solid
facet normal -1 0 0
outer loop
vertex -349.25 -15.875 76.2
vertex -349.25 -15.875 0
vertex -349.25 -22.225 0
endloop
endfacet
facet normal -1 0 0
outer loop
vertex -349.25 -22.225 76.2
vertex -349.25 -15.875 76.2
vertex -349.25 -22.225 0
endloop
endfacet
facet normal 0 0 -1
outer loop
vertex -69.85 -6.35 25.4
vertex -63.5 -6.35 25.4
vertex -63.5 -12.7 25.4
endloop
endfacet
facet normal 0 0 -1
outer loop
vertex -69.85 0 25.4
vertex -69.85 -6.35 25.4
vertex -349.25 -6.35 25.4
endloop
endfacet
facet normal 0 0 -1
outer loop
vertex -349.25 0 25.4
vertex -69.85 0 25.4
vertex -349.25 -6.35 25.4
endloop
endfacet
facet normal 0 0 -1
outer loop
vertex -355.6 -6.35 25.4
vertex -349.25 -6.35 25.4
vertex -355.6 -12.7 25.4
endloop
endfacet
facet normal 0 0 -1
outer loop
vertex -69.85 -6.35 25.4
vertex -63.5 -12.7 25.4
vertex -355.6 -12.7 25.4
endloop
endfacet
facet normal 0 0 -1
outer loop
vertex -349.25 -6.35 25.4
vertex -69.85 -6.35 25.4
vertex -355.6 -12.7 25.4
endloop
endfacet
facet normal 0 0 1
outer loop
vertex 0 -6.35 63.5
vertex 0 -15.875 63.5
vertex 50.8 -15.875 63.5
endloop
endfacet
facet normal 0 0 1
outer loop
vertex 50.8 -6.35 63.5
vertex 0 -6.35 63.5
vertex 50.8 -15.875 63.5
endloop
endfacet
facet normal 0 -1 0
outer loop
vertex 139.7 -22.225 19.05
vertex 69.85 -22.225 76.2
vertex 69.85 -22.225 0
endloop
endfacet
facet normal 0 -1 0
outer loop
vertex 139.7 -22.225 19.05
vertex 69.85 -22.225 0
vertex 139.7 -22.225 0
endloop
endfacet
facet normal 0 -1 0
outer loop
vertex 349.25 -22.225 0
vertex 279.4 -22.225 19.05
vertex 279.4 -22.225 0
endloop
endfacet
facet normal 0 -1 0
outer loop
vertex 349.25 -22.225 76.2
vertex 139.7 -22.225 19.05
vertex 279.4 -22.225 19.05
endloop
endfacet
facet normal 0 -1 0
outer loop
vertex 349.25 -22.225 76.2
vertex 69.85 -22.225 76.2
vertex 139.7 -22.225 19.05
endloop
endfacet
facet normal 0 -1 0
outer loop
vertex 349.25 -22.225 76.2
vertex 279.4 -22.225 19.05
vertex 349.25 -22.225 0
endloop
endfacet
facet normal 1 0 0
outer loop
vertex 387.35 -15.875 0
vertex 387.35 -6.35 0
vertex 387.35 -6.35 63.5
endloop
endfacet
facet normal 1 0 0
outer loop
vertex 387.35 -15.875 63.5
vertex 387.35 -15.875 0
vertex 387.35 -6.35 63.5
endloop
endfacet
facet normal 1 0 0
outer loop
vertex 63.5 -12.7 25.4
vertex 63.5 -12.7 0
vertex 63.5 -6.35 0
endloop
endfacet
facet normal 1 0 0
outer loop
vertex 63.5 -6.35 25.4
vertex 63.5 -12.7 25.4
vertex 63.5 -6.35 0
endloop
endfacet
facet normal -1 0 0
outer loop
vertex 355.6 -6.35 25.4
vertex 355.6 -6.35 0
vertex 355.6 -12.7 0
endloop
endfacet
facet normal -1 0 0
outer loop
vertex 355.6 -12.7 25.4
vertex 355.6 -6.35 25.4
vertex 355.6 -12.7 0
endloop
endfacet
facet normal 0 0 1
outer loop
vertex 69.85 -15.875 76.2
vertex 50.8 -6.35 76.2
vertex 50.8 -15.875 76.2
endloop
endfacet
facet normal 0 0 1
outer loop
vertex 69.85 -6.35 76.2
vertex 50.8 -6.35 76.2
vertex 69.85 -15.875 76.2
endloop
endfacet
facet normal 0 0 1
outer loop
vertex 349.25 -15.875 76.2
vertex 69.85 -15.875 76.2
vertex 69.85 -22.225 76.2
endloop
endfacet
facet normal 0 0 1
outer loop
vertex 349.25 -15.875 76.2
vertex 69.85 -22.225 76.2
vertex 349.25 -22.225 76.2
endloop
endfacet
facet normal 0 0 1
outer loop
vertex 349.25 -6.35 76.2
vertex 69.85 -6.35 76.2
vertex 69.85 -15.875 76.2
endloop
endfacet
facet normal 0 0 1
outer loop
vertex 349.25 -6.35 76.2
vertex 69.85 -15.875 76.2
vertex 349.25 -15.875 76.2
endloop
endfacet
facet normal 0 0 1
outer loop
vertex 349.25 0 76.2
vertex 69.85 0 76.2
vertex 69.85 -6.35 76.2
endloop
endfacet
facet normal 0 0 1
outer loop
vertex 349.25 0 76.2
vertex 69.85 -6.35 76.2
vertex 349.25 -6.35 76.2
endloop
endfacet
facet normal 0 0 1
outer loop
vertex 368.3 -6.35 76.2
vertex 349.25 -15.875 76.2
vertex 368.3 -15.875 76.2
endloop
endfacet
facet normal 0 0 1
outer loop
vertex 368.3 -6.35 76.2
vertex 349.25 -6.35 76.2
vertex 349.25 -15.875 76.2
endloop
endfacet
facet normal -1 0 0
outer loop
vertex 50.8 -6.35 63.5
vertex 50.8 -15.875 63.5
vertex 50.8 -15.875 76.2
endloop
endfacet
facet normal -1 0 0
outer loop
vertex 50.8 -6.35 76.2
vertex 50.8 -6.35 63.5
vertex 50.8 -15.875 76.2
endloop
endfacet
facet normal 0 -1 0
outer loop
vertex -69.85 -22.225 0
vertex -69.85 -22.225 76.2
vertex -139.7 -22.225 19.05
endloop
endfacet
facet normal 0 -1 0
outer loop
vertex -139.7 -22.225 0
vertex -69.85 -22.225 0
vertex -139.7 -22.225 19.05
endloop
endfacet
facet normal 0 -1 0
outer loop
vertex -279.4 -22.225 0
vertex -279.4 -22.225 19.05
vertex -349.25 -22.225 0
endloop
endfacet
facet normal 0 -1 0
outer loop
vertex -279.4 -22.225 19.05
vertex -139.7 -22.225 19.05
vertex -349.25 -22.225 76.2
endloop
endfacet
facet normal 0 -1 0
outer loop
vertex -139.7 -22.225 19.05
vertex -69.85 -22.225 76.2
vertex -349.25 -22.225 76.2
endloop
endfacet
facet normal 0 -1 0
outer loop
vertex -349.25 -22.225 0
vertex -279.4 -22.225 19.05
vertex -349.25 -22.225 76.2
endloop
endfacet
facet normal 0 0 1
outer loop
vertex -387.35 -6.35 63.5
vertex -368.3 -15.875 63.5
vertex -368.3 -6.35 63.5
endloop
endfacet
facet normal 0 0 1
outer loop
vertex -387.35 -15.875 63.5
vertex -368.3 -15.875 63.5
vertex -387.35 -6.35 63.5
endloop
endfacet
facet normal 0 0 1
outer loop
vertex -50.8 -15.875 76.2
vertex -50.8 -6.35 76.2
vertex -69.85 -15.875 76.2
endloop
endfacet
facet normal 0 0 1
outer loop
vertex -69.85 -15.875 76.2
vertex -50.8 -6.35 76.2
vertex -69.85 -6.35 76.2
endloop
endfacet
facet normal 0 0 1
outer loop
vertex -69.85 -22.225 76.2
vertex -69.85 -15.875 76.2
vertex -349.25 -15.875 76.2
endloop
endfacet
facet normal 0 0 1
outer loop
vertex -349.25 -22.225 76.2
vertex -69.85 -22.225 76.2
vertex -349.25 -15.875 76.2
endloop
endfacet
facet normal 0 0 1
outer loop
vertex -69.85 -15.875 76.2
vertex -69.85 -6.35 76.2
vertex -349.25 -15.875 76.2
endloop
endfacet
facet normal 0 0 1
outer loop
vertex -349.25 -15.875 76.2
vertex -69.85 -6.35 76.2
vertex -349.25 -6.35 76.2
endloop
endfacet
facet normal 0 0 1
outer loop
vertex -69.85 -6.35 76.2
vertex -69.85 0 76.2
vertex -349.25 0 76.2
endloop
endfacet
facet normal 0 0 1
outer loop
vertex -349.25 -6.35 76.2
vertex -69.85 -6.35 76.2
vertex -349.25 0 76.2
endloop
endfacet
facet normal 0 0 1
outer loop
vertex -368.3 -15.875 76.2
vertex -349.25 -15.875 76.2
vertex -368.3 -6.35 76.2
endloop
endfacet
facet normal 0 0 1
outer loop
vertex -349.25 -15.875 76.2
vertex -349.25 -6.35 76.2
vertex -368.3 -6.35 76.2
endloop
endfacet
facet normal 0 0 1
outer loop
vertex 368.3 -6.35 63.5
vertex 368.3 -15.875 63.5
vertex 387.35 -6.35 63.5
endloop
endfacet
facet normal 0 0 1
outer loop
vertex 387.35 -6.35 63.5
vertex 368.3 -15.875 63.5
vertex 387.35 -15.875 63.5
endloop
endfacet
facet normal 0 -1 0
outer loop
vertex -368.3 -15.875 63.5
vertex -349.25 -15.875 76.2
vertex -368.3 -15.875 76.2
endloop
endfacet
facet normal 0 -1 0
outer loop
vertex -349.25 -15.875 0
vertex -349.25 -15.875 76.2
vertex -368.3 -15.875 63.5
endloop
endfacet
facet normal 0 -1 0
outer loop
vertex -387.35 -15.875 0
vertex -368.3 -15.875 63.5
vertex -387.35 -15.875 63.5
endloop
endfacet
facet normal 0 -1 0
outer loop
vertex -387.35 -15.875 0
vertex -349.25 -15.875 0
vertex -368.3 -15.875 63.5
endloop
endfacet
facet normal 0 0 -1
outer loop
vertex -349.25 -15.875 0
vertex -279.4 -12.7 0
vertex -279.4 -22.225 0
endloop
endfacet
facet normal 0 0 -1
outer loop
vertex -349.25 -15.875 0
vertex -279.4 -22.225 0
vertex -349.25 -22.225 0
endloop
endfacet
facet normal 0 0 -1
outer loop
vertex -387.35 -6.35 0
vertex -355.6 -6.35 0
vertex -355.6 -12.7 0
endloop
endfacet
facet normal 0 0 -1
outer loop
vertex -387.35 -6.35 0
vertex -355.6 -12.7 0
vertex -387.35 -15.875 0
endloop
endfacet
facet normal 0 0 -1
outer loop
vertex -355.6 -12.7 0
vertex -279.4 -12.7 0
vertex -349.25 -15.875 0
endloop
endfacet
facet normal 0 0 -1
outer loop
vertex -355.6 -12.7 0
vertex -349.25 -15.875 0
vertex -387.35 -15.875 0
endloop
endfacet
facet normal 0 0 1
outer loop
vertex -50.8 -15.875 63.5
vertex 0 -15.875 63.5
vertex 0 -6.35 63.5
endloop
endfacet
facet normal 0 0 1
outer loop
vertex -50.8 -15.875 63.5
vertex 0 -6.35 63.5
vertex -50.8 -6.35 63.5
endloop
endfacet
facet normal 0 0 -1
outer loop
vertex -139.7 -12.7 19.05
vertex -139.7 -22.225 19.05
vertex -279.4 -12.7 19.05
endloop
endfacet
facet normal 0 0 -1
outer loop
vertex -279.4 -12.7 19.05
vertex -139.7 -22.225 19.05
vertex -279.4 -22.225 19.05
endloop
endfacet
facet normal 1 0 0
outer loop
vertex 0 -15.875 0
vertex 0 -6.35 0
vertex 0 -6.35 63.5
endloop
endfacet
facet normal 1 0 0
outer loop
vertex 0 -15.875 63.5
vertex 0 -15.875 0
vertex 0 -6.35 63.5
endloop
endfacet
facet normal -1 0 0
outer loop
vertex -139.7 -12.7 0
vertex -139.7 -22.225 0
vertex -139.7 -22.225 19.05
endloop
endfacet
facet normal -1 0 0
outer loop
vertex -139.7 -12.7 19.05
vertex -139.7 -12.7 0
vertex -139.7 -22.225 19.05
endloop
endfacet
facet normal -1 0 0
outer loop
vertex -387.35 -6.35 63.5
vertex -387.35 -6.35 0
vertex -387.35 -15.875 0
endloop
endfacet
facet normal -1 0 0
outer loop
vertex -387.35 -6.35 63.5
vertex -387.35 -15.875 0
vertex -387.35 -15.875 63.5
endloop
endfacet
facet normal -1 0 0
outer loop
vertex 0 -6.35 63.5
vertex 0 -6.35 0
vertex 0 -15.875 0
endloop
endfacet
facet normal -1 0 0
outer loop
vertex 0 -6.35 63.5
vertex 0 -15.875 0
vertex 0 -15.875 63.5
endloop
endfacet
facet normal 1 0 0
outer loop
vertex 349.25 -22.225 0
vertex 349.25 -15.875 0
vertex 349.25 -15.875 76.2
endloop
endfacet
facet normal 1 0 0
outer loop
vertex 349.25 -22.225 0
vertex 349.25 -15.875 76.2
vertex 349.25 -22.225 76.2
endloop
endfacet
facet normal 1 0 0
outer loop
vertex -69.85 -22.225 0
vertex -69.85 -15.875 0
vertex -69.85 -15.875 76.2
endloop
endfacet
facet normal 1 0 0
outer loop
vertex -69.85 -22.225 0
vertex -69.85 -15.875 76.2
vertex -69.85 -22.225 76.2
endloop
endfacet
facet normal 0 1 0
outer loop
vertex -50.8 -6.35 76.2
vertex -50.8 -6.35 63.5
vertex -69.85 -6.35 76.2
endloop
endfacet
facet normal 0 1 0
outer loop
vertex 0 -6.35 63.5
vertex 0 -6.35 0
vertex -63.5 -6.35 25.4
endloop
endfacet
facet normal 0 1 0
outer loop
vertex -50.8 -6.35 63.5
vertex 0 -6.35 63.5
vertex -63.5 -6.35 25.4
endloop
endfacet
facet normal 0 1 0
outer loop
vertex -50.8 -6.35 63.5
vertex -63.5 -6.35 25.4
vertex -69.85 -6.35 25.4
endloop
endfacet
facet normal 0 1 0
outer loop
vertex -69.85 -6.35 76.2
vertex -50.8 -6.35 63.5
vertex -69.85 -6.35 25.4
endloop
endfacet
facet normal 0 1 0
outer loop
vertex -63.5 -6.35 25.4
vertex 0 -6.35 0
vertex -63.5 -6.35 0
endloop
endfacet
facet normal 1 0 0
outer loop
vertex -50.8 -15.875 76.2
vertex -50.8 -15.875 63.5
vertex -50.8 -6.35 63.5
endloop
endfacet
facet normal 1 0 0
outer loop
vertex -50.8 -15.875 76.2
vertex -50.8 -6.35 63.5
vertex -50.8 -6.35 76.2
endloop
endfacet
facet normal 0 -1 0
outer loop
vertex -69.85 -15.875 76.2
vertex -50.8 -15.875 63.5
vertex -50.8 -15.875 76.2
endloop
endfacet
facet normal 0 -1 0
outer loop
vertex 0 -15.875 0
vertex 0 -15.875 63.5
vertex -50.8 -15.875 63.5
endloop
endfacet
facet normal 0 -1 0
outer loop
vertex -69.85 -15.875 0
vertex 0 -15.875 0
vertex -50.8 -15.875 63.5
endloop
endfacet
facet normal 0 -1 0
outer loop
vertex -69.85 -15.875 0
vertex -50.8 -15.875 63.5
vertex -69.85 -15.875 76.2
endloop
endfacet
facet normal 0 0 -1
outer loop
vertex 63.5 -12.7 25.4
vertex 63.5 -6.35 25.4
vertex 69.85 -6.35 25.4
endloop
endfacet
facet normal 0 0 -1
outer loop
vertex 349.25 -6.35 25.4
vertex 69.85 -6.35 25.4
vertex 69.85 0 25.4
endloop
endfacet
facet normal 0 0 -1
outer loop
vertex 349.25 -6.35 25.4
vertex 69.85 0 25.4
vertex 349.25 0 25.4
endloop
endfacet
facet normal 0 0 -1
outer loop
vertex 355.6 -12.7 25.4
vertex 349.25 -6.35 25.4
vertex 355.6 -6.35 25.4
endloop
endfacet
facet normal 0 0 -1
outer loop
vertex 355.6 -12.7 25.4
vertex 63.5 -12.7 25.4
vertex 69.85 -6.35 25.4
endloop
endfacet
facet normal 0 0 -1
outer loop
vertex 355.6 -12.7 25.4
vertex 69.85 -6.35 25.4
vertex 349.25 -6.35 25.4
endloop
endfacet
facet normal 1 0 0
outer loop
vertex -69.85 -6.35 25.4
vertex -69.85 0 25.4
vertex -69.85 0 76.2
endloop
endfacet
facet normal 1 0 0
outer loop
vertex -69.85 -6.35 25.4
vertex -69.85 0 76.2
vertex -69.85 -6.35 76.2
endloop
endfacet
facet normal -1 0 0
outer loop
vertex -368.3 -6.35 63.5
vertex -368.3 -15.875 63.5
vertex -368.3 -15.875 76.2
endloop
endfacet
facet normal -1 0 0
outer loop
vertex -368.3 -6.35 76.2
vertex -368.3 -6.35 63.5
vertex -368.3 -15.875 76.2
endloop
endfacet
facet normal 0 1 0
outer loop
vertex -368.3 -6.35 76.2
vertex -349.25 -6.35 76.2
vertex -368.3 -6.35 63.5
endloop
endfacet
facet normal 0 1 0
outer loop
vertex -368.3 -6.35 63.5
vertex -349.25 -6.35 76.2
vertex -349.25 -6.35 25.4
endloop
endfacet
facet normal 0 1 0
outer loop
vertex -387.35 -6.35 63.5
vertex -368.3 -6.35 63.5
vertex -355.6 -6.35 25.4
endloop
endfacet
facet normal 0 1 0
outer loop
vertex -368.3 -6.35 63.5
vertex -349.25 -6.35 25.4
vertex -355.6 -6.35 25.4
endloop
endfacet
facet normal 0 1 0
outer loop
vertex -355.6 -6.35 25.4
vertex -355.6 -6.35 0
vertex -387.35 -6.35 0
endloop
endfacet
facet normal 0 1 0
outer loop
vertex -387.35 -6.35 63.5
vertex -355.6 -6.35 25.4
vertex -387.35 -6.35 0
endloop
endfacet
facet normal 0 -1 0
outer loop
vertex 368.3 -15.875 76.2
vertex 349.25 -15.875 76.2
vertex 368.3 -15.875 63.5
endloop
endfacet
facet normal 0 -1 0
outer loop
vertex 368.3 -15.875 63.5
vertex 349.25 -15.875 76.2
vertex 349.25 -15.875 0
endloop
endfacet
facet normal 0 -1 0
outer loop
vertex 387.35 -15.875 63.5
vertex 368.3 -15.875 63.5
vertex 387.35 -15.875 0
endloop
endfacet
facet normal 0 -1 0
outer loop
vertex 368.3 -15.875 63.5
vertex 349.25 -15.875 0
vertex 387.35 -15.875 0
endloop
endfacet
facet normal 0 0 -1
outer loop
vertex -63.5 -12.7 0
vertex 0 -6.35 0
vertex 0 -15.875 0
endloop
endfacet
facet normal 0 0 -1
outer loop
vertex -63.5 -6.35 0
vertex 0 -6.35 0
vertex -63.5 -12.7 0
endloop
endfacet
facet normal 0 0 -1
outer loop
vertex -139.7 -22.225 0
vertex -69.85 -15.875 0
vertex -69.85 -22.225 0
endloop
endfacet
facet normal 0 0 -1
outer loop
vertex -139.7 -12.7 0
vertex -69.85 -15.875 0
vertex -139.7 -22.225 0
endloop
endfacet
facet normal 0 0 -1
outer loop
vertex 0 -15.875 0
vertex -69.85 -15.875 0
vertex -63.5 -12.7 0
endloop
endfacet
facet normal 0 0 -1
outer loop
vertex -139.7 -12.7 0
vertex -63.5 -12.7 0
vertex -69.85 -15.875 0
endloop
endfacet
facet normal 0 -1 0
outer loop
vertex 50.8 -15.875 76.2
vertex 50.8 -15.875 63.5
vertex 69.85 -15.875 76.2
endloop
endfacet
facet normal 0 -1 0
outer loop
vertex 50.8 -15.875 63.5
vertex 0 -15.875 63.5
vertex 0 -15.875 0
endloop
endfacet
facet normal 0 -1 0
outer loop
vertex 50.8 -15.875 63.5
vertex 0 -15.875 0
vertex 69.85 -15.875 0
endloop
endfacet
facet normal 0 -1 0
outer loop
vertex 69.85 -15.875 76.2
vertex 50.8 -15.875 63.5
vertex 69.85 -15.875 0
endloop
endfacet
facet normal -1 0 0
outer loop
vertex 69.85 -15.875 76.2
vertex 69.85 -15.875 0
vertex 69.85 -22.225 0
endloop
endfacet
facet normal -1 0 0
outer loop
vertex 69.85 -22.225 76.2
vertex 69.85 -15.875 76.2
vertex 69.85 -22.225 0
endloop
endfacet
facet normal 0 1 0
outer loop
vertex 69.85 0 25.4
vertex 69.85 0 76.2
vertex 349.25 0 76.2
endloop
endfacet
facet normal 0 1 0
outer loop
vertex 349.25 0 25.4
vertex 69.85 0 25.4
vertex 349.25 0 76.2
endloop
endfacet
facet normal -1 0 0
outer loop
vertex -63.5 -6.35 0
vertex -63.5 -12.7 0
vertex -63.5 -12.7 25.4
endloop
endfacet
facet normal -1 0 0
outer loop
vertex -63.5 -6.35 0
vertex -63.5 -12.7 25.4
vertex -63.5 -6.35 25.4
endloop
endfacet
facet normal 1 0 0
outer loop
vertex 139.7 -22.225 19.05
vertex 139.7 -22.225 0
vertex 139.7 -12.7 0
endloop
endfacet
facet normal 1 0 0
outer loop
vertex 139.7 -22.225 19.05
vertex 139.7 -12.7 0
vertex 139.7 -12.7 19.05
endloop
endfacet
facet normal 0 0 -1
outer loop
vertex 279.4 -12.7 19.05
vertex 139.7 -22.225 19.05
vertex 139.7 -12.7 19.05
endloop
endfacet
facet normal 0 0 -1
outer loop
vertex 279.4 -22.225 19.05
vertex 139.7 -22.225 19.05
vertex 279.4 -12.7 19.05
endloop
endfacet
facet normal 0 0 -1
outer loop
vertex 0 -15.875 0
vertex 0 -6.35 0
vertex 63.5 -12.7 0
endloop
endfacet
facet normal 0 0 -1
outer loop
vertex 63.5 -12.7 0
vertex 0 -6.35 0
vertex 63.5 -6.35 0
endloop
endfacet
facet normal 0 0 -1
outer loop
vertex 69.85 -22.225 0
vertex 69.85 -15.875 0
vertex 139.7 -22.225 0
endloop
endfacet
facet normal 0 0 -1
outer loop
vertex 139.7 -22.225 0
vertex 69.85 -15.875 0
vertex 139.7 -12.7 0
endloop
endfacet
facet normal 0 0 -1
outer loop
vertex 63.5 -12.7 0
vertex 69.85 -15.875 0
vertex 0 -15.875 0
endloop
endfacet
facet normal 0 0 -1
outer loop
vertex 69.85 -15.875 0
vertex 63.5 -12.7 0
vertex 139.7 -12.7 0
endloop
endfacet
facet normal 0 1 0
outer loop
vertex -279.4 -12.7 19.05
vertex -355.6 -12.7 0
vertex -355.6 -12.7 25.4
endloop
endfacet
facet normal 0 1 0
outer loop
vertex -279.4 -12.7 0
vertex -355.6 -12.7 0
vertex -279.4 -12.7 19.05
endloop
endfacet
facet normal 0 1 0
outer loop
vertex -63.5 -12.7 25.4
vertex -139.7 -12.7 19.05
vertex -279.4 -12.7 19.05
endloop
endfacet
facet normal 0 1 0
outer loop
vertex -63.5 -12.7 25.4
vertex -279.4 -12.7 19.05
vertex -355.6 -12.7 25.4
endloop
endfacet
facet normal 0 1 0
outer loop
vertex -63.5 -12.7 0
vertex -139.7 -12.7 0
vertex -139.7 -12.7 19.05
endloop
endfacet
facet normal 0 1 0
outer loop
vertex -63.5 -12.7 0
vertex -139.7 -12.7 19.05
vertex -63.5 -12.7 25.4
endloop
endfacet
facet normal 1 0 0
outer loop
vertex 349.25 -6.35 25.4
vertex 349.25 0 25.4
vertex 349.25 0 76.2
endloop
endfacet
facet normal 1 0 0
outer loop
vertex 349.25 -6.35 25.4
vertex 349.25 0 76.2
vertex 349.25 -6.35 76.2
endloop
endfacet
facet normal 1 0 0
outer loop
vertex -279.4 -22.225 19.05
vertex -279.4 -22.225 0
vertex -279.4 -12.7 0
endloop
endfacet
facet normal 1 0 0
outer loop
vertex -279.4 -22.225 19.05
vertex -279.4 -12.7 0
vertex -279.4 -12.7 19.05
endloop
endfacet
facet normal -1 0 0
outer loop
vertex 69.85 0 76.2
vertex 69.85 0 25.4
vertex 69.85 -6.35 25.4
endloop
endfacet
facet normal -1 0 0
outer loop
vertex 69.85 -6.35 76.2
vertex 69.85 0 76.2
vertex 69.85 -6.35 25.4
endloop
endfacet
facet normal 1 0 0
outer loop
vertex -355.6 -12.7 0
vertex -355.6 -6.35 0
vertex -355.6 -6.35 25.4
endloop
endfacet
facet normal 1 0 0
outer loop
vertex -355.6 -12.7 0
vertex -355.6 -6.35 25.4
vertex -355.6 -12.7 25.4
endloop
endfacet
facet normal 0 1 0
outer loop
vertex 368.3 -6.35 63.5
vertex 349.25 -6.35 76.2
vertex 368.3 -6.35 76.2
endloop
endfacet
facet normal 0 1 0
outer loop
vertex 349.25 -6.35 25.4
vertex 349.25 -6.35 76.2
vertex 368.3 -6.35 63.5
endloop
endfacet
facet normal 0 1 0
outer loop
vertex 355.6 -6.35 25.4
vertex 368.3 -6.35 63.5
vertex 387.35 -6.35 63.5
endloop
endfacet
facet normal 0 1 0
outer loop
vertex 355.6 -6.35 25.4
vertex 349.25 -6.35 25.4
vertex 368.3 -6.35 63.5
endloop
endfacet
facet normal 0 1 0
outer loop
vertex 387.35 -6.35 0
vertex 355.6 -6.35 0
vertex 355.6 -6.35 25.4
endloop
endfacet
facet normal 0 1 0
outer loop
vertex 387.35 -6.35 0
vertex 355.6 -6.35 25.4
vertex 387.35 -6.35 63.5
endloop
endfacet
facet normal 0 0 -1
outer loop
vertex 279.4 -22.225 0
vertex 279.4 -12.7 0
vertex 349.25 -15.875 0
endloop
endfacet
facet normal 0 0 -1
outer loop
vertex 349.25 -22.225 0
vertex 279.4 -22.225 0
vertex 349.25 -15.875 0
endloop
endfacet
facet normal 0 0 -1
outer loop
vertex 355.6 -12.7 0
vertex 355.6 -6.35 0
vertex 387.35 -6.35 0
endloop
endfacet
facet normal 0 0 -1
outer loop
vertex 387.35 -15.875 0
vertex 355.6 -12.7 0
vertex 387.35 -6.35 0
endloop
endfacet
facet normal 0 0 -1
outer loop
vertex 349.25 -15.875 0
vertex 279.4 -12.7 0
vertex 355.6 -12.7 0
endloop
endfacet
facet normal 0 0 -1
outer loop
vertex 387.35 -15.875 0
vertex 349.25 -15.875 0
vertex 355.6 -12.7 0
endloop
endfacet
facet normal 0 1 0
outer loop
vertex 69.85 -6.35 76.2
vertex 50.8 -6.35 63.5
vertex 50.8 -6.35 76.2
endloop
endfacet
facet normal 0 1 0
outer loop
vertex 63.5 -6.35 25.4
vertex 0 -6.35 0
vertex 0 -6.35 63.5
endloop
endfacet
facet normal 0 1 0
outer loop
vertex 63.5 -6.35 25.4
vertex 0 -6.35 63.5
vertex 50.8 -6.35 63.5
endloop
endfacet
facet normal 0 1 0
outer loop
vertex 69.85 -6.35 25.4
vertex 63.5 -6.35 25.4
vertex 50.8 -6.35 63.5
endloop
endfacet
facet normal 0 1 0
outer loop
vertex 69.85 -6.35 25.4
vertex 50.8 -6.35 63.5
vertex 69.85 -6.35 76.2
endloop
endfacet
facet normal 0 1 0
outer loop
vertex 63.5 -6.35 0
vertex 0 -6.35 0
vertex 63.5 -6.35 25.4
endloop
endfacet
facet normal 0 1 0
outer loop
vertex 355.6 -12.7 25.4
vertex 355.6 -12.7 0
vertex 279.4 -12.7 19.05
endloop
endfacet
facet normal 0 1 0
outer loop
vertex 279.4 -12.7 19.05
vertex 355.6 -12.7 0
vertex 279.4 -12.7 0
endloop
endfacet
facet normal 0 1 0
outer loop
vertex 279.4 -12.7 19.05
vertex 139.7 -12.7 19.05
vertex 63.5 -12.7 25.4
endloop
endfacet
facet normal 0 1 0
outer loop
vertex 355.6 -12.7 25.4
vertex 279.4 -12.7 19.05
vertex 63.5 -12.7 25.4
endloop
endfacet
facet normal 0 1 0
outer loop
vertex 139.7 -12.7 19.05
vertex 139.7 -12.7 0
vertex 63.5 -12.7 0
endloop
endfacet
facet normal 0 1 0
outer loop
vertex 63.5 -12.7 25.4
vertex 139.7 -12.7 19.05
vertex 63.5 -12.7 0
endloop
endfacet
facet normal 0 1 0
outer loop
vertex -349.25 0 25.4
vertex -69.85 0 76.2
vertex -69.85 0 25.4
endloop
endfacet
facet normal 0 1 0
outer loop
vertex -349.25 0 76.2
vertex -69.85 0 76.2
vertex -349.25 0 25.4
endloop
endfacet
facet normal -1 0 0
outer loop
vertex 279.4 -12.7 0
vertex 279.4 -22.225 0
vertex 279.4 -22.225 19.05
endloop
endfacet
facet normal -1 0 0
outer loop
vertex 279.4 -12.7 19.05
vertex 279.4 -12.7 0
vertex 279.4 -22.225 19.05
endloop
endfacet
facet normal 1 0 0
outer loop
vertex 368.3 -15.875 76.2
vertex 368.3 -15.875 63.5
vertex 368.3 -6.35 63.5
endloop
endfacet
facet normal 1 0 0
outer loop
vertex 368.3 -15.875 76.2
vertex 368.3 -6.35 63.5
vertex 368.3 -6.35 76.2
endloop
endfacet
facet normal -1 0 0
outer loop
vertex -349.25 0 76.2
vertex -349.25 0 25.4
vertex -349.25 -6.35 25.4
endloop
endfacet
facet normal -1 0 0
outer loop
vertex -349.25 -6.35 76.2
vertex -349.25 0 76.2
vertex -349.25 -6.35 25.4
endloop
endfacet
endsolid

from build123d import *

# Parameters (mm, degrees)
F0_W     = 387.35
F0_H     = 76.2
F1_DEPTH = 22.225
F2_W     = 69.85
F2_H     = 6.35
F2_W_2   = 38.1
F3_DEPTH = 76.2
F4_W     = 50.8
F4_H     = 12.7
F4_W_2   = 19.05
F5_DEPTH = 9.525
F6_W     = 139.7
F6_H     = 19.05
F7_DEPTH = 22.225
F8_W     = 215.9
F8_H     = 12.7
F9_DEPTH = 25.4


with BuildPart() as f1:
    # F0 (on Front) → F1 (new body)
    with BuildSketch(Plane.XZ):
        with Locations((193.675, 38.1)):
            Rectangle(F0_W, F0_H)
    extrude(amount=F1_DEPTH)

    # F2 (on face) → F3 (cut, through all)
    with BuildSketch(Plane(origin=(0, 0, 0), x_dir=(1, 0, 0), z_dir=(0, 0, -1))):
        with Locations((34.925, 19.05)):
            Rectangle(F2_W, F2_H)
        with Locations((34.925, 3.175)):
            Rectangle(F2_W, F2_H)
        with Locations((368.3, 19.05)):
            Rectangle(F2_W_2, F2_H)
        with Locations((368.3, 3.175)):
            Rectangle(F2_W_2, F2_H)
    extrude(amount=-F3_DEPTH, mode=Mode.SUBTRACT)

    # F4 (on face) → F5 (cut, through all)
    with BuildSketch(Plane.XZ.offset(15.875)):
        with Locations((25.4, 69.85)):
            Rectangle(F4_W, F4_H)
        with Locations((377.825, 69.85)):
            Rectangle(F4_W_2, F4_H)
    extrude(amount=-F5_DEPTH, mode=Mode.SUBTRACT)

    # F6 (on face) → F7 (cut, through all)
    with BuildSketch(Plane.XZ.offset(22.225)):
        with Locations((209.55, 9.525)):
            Rectangle(F6_W, F6_H)
    extrude(amount=-F7_DEPTH, mode=Mode.SUBTRACT)

    # F8 (on face) → F9 (cut)
    with BuildSketch(Plane(origin=(0, 0, 0), x_dir=(1, 0, 0), z_dir=(0, 0, -1))):
        Polygon((69.85, 6.35), (69.85, 0), (139.7, 0), (139.7, 12.7), (63.5, 12.7), (63.5, 6.35), align=None)
        with Locations((247.65, 6.35)):
            Rectangle(F8_W, F8_H)
    extrude(amount=-F9_DEPTH, mode=Mode.SUBTRACT)


with BuildPart() as f10_1:
    # F10: instance of F1
    add(f1.part.mirror(Plane.YZ))


solid = Compound([f1.part, f10_1.part])
